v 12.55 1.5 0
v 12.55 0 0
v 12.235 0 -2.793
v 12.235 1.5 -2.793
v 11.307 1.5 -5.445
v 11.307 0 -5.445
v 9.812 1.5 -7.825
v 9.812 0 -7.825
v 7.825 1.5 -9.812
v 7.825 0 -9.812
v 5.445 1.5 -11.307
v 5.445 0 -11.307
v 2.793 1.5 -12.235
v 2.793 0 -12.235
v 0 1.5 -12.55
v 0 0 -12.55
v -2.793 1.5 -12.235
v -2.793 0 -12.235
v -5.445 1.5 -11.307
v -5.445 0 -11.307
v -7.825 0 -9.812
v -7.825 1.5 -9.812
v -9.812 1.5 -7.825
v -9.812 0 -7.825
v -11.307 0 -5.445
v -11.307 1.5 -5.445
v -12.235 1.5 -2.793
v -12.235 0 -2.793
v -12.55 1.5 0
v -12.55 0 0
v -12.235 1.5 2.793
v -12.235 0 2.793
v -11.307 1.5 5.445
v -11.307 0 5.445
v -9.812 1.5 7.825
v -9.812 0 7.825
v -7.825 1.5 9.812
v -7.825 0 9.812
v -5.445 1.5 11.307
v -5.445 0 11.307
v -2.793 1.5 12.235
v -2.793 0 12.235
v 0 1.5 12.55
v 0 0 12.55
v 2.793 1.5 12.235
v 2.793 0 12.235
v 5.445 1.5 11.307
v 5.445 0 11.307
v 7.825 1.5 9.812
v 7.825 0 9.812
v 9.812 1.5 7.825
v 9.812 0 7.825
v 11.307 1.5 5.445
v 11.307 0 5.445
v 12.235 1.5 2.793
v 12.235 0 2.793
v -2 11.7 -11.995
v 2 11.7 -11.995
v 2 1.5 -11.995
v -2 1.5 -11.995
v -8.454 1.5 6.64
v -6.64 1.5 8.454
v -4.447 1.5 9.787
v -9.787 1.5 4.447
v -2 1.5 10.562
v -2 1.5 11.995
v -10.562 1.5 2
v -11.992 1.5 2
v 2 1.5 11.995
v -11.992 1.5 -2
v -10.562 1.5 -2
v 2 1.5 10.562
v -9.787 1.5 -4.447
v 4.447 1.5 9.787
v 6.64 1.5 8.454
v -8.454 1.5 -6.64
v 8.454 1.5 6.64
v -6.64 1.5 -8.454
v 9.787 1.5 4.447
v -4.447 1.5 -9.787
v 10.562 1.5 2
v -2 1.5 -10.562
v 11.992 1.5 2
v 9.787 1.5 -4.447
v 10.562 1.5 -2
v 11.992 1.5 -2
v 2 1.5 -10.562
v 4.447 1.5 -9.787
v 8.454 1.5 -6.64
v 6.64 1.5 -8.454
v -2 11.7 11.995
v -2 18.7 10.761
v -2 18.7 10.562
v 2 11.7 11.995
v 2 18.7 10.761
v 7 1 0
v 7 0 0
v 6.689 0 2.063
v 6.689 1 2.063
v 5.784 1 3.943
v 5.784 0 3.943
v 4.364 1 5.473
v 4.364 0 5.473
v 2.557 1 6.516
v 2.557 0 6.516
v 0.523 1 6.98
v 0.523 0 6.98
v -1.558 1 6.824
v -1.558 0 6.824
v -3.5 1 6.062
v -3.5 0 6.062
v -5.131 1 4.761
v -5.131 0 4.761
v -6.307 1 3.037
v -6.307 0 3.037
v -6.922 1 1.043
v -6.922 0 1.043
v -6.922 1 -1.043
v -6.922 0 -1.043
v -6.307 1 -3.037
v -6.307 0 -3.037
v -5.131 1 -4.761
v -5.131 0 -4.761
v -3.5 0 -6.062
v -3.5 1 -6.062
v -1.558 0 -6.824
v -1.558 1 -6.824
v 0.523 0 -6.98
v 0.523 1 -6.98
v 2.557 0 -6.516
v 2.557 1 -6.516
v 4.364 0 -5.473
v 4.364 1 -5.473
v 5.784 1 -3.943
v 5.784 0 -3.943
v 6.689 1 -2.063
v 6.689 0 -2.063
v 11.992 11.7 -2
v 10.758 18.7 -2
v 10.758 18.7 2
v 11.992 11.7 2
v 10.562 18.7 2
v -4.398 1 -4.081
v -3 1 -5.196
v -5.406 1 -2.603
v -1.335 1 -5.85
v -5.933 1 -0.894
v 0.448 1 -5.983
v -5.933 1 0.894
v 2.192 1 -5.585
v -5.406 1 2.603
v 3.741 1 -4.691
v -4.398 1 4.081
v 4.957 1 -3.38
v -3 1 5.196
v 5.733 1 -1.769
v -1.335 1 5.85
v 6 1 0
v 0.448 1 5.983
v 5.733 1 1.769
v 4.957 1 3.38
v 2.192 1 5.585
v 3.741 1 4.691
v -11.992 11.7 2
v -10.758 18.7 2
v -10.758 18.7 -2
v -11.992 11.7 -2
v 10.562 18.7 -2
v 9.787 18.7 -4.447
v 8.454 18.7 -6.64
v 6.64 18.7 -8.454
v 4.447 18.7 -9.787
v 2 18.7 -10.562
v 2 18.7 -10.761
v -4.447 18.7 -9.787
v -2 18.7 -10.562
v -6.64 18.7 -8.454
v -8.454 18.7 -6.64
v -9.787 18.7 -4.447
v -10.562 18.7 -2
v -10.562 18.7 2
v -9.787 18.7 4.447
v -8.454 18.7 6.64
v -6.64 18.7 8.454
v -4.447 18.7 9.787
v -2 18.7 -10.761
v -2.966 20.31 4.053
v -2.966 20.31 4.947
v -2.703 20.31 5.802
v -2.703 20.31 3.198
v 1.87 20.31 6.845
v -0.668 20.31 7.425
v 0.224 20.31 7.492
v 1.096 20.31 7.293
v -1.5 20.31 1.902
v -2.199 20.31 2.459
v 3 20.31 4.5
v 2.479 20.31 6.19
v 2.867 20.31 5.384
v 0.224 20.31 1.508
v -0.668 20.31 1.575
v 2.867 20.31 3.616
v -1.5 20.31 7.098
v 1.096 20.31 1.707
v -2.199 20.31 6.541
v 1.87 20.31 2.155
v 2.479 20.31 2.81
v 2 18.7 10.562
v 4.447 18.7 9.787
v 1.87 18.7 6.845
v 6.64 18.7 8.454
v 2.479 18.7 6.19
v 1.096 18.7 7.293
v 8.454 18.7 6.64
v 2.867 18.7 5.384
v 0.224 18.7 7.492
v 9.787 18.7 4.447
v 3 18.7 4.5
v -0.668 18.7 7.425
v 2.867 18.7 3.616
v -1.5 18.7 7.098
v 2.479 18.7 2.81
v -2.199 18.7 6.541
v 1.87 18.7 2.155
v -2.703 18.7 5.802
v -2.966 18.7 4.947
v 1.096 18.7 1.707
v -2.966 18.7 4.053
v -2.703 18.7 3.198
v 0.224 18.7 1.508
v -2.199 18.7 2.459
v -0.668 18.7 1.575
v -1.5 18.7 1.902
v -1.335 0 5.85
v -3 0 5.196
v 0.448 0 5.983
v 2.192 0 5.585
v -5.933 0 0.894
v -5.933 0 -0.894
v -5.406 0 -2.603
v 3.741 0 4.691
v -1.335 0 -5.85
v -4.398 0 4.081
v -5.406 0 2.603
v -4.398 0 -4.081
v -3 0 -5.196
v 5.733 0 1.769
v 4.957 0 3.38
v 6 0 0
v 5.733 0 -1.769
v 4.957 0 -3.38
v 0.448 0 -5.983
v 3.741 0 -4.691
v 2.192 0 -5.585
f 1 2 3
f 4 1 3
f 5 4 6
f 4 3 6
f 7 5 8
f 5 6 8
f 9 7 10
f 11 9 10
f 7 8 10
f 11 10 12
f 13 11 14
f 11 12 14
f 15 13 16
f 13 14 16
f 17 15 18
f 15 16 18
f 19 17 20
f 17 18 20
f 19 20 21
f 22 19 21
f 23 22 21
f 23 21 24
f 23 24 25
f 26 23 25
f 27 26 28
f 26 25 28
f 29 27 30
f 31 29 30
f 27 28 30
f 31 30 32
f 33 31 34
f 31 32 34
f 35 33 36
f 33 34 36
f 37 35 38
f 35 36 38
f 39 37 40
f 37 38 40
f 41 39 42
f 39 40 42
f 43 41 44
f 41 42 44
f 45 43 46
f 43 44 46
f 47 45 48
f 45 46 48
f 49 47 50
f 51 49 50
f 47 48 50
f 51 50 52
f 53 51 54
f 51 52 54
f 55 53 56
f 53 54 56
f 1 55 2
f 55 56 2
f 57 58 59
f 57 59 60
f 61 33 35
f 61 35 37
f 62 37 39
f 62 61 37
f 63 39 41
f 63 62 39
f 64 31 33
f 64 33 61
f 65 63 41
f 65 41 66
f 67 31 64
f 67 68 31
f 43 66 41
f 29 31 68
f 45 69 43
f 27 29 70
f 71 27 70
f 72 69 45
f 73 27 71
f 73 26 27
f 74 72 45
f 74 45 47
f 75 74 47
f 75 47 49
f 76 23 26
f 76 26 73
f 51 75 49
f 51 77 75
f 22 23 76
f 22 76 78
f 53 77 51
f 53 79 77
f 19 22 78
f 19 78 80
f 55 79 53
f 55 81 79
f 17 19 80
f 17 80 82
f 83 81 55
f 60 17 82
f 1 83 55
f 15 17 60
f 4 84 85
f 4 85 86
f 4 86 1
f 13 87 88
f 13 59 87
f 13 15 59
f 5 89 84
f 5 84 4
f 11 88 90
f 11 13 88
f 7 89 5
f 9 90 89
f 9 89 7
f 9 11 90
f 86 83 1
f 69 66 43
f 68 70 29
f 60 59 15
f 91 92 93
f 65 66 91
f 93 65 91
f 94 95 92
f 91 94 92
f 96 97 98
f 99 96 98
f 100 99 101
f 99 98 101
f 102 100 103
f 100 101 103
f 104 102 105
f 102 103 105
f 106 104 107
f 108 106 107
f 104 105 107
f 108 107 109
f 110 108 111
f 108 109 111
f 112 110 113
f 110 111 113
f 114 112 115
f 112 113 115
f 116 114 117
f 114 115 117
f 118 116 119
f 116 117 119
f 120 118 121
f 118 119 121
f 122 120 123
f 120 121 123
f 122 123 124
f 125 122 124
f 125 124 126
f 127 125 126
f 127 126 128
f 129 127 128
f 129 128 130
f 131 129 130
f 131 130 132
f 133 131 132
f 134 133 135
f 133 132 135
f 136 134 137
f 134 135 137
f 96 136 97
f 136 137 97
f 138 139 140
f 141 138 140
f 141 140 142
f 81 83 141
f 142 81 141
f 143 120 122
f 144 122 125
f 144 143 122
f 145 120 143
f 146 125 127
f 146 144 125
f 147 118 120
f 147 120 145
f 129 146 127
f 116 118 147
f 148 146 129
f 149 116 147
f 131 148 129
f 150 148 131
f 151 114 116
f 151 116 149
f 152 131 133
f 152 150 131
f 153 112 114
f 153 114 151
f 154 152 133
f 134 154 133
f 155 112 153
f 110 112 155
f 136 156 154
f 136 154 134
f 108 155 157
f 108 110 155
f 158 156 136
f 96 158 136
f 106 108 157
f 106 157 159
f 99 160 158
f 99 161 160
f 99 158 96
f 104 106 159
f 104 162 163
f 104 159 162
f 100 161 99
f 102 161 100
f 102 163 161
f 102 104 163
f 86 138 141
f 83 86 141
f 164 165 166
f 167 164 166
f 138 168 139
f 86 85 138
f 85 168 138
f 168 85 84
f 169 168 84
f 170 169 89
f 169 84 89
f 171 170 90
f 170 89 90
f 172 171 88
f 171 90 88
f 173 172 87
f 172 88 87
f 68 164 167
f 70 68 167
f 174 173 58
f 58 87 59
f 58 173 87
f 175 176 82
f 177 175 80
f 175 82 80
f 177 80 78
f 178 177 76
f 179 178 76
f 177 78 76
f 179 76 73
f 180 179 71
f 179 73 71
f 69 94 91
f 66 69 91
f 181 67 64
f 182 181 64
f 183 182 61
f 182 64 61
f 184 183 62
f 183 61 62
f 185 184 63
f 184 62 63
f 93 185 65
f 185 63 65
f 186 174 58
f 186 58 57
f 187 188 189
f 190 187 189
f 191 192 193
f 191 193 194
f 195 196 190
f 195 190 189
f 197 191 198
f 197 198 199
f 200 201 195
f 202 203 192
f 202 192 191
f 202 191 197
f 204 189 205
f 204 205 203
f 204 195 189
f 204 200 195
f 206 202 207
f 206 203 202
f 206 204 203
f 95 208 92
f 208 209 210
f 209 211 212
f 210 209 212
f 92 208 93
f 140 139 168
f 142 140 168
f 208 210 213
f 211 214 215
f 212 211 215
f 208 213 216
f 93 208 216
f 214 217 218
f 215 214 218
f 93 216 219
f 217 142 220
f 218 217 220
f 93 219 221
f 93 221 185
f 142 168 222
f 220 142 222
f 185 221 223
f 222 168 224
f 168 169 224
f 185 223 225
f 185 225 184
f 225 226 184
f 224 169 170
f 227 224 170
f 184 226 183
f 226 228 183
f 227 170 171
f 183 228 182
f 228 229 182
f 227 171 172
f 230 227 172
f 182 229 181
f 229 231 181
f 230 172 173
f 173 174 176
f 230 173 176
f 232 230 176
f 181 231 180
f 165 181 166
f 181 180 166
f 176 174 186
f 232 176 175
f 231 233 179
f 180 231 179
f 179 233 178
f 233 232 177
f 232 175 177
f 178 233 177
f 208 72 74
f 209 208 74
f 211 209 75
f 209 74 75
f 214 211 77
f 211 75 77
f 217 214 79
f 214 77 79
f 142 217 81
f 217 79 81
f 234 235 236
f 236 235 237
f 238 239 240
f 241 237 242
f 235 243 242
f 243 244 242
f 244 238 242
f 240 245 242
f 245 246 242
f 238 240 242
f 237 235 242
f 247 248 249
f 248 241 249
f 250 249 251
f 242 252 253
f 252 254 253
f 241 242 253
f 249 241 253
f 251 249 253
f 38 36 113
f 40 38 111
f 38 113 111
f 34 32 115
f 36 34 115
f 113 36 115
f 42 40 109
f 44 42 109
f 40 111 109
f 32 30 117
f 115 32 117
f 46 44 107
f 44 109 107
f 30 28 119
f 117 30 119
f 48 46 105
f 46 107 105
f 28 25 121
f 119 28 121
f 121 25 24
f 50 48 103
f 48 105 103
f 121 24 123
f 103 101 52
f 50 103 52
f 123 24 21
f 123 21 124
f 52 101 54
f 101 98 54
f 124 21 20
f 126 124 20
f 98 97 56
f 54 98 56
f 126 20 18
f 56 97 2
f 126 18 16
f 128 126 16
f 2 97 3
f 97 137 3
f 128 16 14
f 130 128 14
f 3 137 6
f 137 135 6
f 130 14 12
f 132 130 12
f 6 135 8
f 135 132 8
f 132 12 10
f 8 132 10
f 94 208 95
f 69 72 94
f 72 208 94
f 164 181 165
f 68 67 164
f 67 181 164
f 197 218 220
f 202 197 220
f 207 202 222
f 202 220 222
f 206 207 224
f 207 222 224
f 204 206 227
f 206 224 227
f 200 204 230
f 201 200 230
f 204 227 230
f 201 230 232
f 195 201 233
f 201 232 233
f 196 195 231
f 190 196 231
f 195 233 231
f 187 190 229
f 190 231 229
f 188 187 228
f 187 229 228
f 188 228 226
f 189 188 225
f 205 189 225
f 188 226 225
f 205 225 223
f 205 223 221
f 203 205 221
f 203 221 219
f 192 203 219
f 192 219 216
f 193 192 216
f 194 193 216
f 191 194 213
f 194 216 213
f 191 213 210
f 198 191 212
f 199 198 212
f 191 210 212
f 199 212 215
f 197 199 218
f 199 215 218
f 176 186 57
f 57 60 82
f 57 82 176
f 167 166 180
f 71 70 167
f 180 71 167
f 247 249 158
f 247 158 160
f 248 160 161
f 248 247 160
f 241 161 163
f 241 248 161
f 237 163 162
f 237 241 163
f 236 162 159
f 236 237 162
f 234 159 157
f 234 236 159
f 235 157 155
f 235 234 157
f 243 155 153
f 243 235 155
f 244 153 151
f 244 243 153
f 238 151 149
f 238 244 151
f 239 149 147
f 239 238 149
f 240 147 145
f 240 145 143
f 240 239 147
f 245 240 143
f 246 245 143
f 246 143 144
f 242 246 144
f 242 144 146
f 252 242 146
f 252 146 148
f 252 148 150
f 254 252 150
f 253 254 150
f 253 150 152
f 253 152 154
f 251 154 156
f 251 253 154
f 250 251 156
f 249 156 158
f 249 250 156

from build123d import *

# Parameters (mm, degrees)
SKETCH1_R             = 12.55
BOSS_EXTRUDE1_DEPTH   = 1.5
SKETCH2_R             = 10.75
BOSS_EXTRUDE2_DEPTH   = 17.2
BOSS_EXTRUDE3_DEPTH   = 17.2
SKETCH4_R             = 3
BOSS_EXTRUDE4_DEPTH   = 1.61
SKETCH5_R             = 7
SKETCH5_R_2           = 6
CUT_EXTRUDE1_DEPTH    = 1
CHAMFER1_SIZE         = 7
CHAMFER1_SIZE2        = 1.234288865
CHAMFER1_PART_2_SIZE  = 7
CHAMFER1_PART_2_SIZE2 = 1.234288865
CHAMFER1_PART_3_SIZE  = 7
CHAMFER1_PART_3_SIZE2 = 1.234288865
CHAMFER1_PART_4_SIZE  = 7
CHAMFER1_PART_4_SIZE2 = 1.234288865


with BuildPart() as part:
    # Sketch1 → Boss-Extrude1 (new body)
    with BuildSketch(Plane(origin=(0, 0, 0), x_dir=(1, 0, 0), z_dir=(0, 1, 0))):
        Circle(SKETCH1_R)
    extrude(amount=BOSS_EXTRUDE1_DEPTH)

    # Sketch2 → Boss-Extrude2 (add)
    with BuildSketch(Plane(origin=(0, 1.5, 0), x_dir=(1, 0, 0), z_dir=(0, 1, 0))):
        Circle(SKETCH2_R)
    extrude(amount=BOSS_EXTRUDE2_DEPTH)

    # Sketch3 → Boss-Extrude3 (add)
    with BuildSketch(Plane(origin=(0, 1.5, 0), x_dir=(1, 0, 0), z_dir=(0, 1, 0))):
        with BuildLine():
            Line((2, 11.994879818), (-2, 11.994879818))
            Line((-2, 11.994879818), (-2, 10.562315087))
            ThreePointArc((-2, 10.562315087), (0, 10.75), (2, 10.562315087))
            Line((2, 10.562315087), (2, 11.994879818))
        make_face()
        with BuildLine():
            Line((-11.992315087, -2), (-11.992315087, 2))
            Line((-11.992315087, 2), (-10.562315087, 2))
            ThreePointArc((-10.562315087, 2), (-10.75, 0), (-10.562315087, -2))
            Line((-10.562315087, -2), (-11.992315087, -2))
        make_face()
        with BuildLine():
            Line((-2, -11.994879818), (-2, -10.562315087))
            ThreePointArc((-2, -10.562315087), (0, -10.75), (2, -10.562315087))
            Line((2, -10.562315087), (2, -11.994879818))
            Line((2, -11.994879818), (-2, -11.994879818))
        make_face()
        with BuildLine():
            Line((11.992315087, -2), (10.562315087, -2))
            ThreePointArc((10.562315087, -2), (10.75, 0), (10.562315087, 2))
            Line((10.562315087, 2), (11.992315087, 2))
            Line((11.992315087, 2), (11.992315087, -2))
        make_face()
    extrude(amount=BOSS_EXTRUDE3_DEPTH)

    # Sketch4 → Boss-Extrude4 (add)
    with BuildSketch(Plane(origin=(0, 18.7, 0), x_dir=(1, 0, 0), z_dir=(0, 1, 0))):
        with Locations((0, -4.5)):
            Circle(SKETCH4_R)
    extrude(amount=BOSS_EXTRUDE4_DEPTH)

    # Sketch5 → Cut-Extrude1 (cut)
    with BuildSketch(Plane.XZ):
        Circle(SKETCH5_R)
        Circle(SKETCH5_R_2, mode=Mode.SUBTRACT)
    extrude(amount=-CUT_EXTRUDE1_DEPTH, mode=Mode.SUBTRACT)

    # Chamfer1
    chamfer1_edges = [part.edges().sort_by_distance(p)[0] for p in [
        (0, 18.7, -11.994879818),
    ]]
    chamfer1_side = [part.faces().sort_by_distance(p)[0] for p in [
        (0, 10.1, -11.994879818),
    ]]
    chamfer(chamfer1_edges, length=CHAMFER1_SIZE, length2=CHAMFER1_SIZE2, reference=chamfer1_side[0])

    # Chamfer1 part 2
    chamfer1_part_2_edges = [part.edges().sort_by_distance(p)[0] for p in [
        (11.992315087, 18.7, 0),
    ]]
    chamfer1_part_2_side = [part.faces().sort_by_distance(p)[0] for p in [
        (11.992315087, 10.1, 0),
    ]]
    chamfer(chamfer1_part_2_edges, length=CHAMFER1_PART_2_SIZE, length2=CHAMFER1_PART_2_SIZE2, reference=chamfer1_part_2_side[0])

    # Chamfer1 part 3
    chamfer1_part_3_edges = [part.edges().sort_by_distance(p)[0] for p in [
        (-11.992315087, 18.7, 0),
    ]]
    chamfer1_part_3_side = [part.faces().sort_by_distance(p)[0] for p in [
        (-11.992315087, 10.1, 0),
    ]]
    chamfer(chamfer1_part_3_edges, length=CHAMFER1_PART_3_SIZE, length2=CHAMFER1_PART_3_SIZE2, reference=chamfer1_part_3_side[0])

    # Chamfer1 part 4
    chamfer1_part_4_edges = [part.edges().sort_by_distance(p)[0] for p in [
        (0, 18.7, 11.994879818),
    ]]
    chamfer1_part_4_side = [part.faces().sort_by_distance(p)[0] for p in [
        (0, 10.1, 11.994879818),
    ]]
    chamfer(chamfer1_part_4_edges, length=CHAMFER1_PART_4_SIZE, length2=CHAMFER1_PART_4_SIZE2, reference=chamfer1_part_4_side[0])


solid = part.part
